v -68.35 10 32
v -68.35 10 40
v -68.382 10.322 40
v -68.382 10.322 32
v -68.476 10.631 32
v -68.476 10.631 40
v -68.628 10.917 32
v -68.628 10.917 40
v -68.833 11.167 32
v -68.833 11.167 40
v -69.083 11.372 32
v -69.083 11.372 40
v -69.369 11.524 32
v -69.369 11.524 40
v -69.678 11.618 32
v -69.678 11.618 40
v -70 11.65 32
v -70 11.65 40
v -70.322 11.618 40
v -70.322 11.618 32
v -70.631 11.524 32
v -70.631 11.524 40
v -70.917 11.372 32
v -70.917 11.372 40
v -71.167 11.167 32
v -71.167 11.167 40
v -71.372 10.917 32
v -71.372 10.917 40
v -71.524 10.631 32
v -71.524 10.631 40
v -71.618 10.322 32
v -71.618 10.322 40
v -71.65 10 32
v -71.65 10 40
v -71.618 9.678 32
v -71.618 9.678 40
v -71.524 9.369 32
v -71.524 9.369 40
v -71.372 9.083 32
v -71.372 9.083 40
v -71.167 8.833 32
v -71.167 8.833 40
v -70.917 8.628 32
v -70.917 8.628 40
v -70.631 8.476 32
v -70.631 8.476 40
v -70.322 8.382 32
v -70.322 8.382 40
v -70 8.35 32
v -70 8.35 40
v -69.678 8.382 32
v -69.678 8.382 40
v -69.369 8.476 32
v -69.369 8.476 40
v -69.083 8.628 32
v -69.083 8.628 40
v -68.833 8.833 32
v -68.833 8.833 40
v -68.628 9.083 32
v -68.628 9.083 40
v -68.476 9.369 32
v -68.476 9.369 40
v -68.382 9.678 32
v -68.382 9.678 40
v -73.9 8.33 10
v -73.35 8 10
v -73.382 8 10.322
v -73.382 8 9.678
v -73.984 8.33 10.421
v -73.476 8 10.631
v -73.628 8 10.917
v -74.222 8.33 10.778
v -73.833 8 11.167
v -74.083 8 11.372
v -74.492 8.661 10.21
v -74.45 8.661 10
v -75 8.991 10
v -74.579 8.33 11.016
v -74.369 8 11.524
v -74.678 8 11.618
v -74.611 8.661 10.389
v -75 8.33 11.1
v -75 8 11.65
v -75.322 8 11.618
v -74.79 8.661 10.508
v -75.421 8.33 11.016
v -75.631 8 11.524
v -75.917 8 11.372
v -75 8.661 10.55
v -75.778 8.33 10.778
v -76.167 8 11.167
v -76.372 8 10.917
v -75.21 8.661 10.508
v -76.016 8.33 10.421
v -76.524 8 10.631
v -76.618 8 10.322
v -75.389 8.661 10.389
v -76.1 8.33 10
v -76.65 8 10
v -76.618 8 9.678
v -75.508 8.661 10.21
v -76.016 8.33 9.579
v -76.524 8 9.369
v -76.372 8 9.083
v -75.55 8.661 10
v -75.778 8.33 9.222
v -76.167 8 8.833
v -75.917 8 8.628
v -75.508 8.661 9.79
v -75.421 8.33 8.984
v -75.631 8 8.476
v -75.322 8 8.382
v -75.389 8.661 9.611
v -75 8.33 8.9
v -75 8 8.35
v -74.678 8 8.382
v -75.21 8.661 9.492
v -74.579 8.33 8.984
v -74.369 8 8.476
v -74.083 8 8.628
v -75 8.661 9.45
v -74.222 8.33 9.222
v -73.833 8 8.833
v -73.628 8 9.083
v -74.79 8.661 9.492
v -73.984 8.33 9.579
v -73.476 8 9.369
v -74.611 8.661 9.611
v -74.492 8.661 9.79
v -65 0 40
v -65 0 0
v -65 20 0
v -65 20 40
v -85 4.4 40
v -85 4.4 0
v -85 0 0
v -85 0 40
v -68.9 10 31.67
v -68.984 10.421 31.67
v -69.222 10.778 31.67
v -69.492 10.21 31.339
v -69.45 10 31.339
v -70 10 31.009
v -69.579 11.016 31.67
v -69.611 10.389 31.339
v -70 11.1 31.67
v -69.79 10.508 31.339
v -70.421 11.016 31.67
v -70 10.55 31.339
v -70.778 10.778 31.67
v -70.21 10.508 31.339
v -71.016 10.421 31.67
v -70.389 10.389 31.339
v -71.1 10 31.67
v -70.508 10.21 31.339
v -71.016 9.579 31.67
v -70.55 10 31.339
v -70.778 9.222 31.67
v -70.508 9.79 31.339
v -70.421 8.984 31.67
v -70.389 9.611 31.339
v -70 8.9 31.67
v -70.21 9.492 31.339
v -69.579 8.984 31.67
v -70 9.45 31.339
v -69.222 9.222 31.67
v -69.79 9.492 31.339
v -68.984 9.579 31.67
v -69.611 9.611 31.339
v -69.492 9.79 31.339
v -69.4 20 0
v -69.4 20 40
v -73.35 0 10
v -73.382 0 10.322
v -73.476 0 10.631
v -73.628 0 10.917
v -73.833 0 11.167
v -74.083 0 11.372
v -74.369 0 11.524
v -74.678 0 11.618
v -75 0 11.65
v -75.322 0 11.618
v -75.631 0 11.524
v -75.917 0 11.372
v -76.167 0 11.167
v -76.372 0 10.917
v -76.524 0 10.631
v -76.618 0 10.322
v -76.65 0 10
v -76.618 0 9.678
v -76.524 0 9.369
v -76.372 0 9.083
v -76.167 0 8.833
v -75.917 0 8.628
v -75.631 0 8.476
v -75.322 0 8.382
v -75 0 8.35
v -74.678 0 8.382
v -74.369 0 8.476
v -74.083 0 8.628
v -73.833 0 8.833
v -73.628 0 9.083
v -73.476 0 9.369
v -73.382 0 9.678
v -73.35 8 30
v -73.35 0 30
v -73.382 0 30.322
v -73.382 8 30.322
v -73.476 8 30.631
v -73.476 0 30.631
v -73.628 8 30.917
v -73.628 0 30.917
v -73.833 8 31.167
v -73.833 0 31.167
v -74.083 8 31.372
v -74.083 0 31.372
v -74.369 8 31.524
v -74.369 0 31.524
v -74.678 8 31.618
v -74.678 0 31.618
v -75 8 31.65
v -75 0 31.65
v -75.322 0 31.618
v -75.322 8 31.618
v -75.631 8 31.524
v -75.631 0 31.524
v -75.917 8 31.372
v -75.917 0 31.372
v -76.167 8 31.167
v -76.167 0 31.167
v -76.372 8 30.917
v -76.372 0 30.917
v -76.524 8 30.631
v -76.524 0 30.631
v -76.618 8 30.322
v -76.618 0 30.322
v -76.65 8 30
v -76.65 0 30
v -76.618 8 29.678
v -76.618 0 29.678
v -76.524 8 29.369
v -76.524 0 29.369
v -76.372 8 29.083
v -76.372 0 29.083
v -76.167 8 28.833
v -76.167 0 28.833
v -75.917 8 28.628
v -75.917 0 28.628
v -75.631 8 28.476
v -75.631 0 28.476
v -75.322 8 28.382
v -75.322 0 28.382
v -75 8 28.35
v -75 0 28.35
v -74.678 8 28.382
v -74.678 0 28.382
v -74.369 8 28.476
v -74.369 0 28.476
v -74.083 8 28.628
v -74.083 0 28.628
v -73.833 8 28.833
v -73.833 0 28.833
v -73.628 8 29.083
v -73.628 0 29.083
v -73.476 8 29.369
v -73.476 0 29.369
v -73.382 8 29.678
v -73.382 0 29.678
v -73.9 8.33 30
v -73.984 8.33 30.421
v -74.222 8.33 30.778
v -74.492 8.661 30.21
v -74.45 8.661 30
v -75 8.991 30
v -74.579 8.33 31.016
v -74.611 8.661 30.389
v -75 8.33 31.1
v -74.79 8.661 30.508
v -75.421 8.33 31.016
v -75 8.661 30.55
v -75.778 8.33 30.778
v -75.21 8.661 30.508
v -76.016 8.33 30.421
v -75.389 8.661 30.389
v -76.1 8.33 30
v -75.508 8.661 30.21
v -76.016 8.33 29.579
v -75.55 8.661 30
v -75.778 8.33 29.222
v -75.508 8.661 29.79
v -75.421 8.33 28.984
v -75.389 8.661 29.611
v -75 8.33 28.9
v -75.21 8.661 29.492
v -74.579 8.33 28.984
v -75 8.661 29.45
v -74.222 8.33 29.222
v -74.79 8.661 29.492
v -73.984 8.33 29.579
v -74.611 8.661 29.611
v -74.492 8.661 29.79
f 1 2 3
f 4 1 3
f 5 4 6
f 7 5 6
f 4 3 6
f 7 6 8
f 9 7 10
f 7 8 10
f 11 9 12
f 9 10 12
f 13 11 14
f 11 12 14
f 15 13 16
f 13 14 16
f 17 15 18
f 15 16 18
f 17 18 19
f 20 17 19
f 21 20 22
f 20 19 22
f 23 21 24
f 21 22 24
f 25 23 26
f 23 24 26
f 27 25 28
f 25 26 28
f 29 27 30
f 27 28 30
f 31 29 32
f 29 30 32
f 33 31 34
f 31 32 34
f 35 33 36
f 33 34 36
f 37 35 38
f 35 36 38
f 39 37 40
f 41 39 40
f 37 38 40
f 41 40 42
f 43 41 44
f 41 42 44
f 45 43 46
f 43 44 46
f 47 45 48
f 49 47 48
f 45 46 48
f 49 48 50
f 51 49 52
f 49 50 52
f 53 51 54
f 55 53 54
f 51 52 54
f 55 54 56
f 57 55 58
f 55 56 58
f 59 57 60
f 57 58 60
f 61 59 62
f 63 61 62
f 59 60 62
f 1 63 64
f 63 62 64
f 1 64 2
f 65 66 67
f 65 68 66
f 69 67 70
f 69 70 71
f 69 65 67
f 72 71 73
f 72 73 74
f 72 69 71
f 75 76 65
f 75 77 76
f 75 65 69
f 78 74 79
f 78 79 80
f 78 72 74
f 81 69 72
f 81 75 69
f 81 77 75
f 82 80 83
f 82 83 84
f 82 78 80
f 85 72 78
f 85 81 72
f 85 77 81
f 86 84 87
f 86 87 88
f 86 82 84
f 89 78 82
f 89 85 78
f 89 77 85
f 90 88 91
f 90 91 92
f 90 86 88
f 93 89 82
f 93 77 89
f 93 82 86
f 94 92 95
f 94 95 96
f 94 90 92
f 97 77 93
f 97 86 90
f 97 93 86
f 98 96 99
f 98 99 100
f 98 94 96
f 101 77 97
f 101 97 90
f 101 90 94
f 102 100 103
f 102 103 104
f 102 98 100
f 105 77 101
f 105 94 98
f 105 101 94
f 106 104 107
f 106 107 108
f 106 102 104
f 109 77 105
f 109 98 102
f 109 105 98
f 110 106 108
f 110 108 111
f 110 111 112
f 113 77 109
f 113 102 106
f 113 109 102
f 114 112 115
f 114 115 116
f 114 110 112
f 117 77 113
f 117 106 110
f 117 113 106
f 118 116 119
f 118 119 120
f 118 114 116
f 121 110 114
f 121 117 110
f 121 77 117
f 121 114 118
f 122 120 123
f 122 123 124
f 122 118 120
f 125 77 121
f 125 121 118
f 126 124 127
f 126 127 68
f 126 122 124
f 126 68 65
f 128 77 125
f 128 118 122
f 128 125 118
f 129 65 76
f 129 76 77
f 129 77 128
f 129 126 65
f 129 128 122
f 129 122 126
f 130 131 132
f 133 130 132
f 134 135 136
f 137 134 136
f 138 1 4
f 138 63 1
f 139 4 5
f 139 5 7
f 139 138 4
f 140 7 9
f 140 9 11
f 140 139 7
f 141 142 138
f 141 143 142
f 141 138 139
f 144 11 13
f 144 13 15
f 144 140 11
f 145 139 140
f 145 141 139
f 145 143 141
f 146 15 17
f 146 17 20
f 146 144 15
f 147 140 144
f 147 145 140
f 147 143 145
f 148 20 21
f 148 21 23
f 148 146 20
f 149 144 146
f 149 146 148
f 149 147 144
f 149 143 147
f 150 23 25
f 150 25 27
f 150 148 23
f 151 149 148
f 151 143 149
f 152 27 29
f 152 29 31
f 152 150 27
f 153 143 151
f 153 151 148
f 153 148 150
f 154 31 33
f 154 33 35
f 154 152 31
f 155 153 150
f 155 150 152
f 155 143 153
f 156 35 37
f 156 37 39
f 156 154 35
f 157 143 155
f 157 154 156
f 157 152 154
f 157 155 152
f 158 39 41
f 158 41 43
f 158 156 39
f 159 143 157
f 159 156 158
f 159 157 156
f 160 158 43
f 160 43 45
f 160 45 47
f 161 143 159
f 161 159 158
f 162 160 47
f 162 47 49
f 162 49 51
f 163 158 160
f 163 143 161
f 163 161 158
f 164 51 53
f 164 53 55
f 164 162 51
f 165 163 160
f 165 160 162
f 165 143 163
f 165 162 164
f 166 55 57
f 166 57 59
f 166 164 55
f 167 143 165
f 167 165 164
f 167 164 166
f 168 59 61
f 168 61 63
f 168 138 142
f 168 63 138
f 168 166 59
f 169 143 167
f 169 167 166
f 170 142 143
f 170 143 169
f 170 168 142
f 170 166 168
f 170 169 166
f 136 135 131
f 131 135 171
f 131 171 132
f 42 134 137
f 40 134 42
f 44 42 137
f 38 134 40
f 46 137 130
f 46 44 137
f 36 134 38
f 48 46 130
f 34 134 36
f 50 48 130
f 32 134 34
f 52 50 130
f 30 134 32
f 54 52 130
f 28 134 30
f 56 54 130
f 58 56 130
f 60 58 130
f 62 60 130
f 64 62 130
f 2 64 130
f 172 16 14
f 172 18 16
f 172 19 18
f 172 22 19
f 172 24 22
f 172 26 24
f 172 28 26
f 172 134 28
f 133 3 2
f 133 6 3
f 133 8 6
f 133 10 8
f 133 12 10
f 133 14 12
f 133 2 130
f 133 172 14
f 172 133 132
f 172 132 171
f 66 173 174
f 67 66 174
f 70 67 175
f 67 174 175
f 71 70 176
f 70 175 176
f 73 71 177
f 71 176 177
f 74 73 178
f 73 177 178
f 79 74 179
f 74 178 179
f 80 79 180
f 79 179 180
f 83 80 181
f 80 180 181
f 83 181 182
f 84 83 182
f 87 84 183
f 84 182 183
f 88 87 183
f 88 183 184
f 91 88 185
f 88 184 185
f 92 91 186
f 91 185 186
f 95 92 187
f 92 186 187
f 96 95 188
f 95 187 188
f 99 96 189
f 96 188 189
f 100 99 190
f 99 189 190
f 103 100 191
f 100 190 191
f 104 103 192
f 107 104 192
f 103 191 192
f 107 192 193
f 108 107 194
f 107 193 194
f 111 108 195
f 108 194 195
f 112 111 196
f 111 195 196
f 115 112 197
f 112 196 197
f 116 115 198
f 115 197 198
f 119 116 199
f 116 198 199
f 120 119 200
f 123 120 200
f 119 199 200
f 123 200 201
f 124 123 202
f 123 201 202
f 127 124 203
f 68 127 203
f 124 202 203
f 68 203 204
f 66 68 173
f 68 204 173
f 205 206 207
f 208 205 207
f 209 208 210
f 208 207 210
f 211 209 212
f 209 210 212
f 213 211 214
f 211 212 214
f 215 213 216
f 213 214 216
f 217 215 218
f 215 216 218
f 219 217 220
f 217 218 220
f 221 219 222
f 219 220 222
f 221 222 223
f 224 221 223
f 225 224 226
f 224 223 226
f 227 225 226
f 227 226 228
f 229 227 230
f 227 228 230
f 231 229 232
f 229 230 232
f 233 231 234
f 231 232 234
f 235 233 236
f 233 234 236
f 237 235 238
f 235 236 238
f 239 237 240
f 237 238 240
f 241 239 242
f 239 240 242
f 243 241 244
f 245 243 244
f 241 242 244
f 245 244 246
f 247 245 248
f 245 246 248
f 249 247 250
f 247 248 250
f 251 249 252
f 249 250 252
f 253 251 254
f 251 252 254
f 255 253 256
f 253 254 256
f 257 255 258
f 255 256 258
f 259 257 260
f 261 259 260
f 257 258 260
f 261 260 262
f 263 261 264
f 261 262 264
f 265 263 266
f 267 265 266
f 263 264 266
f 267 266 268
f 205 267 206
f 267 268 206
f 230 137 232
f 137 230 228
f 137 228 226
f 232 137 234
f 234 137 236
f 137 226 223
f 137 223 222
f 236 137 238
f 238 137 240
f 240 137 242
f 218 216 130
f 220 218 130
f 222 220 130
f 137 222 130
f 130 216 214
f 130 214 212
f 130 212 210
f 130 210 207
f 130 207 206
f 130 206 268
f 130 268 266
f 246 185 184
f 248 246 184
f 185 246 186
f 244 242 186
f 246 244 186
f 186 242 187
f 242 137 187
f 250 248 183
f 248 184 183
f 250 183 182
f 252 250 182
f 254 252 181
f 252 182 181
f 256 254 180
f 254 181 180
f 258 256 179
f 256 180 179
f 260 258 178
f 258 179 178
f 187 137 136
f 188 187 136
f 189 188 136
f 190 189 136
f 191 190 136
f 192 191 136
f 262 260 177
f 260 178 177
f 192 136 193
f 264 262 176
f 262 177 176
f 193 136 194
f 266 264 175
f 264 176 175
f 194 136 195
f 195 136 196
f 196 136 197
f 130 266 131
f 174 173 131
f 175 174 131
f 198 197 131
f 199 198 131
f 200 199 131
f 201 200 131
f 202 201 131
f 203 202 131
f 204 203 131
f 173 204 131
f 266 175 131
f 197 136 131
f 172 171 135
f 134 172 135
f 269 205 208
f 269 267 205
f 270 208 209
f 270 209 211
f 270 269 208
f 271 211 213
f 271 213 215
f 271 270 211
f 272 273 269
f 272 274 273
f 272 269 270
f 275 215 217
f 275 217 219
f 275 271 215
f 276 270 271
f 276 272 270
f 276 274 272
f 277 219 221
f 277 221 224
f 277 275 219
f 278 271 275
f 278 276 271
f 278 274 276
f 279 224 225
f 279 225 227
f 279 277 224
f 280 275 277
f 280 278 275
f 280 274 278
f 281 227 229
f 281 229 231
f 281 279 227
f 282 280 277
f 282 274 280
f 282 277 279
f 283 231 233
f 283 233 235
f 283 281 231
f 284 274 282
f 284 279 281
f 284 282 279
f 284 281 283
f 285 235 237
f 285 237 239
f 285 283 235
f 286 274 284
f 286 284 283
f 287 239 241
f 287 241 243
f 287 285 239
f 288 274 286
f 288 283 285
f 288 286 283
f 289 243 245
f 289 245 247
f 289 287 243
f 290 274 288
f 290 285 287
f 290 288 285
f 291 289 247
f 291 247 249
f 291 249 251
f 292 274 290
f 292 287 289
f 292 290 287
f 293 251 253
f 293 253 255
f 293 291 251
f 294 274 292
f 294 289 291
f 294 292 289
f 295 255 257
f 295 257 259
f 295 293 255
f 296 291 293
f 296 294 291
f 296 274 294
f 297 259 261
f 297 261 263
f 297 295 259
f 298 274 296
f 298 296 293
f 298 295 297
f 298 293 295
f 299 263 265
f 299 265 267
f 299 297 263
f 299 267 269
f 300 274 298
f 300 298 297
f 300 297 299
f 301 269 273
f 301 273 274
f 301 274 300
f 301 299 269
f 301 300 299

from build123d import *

# Parameters (mm, degrees)
PAD_DEPTH      = 40
SKETCH001_R    = 1.65
HOLE_DEPTH     = 8
HOLE_TIPS_R    = 1.65
SKETCH002_R    = 1.65
HOLE001_DEPTH  = 8
HOLE001_TIPS_R = 1.65


with BuildPart() as part:
    # Sketch → Pad (new body)
    with BuildSketch(Plane.XY):
        Polygon((-85, 0), (-65, 0), (-65, 20), (-69.4, 20), (-85, 4.4), align=None)
    extrude(amount=PAD_DEPTH)

    # Sketch001 (on Face1 of Pad) → Hole (cut)
    with BuildSketch(Plane.XZ):
        with Locations((-75, 30)):
            Circle(SKETCH001_R)
        with Locations((-75, 10)):
            Circle(SKETCH001_R)
    extrude(amount=-HOLE_DEPTH, mode=Mode.SUBTRACT)

    # Hole tips → Hole tip 1 section 0
    with BuildSketch(Plane.XZ.offset(-8), mode=Mode.PRIVATE) as hole_tip_1_s0:
        with Locations((-75, 30)):
            Circle(HOLE_TIPS_R)
    loft([hole_tip_1_s0.sketch, Vertex(-75, 8.99142, 30)], mode=Mode.SUBTRACT)

    # Hole tips → Hole tip 2 section 0
    with BuildSketch(Plane.XZ.offset(-8), mode=Mode.PRIVATE) as hole_tip_2_s0:
        with Locations((-75, 10)):
            Circle(HOLE_TIPS_R)
    loft([hole_tip_2_s0.sketch, Vertex(-75, 8.99142, 10)], mode=Mode.SUBTRACT)

    # Sketch002 (on Face4 of Hole) → Hole001 (cut)
    with BuildSketch(Plane.XY.offset(40)):
        with Locations((-70, 10)):
            Circle(SKETCH002_R)
    extrude(amount=-HOLE001_DEPTH, mode=Mode.SUBTRACT)

    # Hole001 tips → Hole001 tip 1 section 0
    with BuildSketch(Plane.XY.offset(32), mode=Mode.PRIVATE) as hole001_tip_1_s0:
        with Locations((-70, 10)):
            Circle(HOLE001_TIPS_R)
    loft([hole001_tip_1_s0.sketch, Vertex(-70, 10, 31.00858)], mode=Mode.SUBTRACT)


solid = part.part
